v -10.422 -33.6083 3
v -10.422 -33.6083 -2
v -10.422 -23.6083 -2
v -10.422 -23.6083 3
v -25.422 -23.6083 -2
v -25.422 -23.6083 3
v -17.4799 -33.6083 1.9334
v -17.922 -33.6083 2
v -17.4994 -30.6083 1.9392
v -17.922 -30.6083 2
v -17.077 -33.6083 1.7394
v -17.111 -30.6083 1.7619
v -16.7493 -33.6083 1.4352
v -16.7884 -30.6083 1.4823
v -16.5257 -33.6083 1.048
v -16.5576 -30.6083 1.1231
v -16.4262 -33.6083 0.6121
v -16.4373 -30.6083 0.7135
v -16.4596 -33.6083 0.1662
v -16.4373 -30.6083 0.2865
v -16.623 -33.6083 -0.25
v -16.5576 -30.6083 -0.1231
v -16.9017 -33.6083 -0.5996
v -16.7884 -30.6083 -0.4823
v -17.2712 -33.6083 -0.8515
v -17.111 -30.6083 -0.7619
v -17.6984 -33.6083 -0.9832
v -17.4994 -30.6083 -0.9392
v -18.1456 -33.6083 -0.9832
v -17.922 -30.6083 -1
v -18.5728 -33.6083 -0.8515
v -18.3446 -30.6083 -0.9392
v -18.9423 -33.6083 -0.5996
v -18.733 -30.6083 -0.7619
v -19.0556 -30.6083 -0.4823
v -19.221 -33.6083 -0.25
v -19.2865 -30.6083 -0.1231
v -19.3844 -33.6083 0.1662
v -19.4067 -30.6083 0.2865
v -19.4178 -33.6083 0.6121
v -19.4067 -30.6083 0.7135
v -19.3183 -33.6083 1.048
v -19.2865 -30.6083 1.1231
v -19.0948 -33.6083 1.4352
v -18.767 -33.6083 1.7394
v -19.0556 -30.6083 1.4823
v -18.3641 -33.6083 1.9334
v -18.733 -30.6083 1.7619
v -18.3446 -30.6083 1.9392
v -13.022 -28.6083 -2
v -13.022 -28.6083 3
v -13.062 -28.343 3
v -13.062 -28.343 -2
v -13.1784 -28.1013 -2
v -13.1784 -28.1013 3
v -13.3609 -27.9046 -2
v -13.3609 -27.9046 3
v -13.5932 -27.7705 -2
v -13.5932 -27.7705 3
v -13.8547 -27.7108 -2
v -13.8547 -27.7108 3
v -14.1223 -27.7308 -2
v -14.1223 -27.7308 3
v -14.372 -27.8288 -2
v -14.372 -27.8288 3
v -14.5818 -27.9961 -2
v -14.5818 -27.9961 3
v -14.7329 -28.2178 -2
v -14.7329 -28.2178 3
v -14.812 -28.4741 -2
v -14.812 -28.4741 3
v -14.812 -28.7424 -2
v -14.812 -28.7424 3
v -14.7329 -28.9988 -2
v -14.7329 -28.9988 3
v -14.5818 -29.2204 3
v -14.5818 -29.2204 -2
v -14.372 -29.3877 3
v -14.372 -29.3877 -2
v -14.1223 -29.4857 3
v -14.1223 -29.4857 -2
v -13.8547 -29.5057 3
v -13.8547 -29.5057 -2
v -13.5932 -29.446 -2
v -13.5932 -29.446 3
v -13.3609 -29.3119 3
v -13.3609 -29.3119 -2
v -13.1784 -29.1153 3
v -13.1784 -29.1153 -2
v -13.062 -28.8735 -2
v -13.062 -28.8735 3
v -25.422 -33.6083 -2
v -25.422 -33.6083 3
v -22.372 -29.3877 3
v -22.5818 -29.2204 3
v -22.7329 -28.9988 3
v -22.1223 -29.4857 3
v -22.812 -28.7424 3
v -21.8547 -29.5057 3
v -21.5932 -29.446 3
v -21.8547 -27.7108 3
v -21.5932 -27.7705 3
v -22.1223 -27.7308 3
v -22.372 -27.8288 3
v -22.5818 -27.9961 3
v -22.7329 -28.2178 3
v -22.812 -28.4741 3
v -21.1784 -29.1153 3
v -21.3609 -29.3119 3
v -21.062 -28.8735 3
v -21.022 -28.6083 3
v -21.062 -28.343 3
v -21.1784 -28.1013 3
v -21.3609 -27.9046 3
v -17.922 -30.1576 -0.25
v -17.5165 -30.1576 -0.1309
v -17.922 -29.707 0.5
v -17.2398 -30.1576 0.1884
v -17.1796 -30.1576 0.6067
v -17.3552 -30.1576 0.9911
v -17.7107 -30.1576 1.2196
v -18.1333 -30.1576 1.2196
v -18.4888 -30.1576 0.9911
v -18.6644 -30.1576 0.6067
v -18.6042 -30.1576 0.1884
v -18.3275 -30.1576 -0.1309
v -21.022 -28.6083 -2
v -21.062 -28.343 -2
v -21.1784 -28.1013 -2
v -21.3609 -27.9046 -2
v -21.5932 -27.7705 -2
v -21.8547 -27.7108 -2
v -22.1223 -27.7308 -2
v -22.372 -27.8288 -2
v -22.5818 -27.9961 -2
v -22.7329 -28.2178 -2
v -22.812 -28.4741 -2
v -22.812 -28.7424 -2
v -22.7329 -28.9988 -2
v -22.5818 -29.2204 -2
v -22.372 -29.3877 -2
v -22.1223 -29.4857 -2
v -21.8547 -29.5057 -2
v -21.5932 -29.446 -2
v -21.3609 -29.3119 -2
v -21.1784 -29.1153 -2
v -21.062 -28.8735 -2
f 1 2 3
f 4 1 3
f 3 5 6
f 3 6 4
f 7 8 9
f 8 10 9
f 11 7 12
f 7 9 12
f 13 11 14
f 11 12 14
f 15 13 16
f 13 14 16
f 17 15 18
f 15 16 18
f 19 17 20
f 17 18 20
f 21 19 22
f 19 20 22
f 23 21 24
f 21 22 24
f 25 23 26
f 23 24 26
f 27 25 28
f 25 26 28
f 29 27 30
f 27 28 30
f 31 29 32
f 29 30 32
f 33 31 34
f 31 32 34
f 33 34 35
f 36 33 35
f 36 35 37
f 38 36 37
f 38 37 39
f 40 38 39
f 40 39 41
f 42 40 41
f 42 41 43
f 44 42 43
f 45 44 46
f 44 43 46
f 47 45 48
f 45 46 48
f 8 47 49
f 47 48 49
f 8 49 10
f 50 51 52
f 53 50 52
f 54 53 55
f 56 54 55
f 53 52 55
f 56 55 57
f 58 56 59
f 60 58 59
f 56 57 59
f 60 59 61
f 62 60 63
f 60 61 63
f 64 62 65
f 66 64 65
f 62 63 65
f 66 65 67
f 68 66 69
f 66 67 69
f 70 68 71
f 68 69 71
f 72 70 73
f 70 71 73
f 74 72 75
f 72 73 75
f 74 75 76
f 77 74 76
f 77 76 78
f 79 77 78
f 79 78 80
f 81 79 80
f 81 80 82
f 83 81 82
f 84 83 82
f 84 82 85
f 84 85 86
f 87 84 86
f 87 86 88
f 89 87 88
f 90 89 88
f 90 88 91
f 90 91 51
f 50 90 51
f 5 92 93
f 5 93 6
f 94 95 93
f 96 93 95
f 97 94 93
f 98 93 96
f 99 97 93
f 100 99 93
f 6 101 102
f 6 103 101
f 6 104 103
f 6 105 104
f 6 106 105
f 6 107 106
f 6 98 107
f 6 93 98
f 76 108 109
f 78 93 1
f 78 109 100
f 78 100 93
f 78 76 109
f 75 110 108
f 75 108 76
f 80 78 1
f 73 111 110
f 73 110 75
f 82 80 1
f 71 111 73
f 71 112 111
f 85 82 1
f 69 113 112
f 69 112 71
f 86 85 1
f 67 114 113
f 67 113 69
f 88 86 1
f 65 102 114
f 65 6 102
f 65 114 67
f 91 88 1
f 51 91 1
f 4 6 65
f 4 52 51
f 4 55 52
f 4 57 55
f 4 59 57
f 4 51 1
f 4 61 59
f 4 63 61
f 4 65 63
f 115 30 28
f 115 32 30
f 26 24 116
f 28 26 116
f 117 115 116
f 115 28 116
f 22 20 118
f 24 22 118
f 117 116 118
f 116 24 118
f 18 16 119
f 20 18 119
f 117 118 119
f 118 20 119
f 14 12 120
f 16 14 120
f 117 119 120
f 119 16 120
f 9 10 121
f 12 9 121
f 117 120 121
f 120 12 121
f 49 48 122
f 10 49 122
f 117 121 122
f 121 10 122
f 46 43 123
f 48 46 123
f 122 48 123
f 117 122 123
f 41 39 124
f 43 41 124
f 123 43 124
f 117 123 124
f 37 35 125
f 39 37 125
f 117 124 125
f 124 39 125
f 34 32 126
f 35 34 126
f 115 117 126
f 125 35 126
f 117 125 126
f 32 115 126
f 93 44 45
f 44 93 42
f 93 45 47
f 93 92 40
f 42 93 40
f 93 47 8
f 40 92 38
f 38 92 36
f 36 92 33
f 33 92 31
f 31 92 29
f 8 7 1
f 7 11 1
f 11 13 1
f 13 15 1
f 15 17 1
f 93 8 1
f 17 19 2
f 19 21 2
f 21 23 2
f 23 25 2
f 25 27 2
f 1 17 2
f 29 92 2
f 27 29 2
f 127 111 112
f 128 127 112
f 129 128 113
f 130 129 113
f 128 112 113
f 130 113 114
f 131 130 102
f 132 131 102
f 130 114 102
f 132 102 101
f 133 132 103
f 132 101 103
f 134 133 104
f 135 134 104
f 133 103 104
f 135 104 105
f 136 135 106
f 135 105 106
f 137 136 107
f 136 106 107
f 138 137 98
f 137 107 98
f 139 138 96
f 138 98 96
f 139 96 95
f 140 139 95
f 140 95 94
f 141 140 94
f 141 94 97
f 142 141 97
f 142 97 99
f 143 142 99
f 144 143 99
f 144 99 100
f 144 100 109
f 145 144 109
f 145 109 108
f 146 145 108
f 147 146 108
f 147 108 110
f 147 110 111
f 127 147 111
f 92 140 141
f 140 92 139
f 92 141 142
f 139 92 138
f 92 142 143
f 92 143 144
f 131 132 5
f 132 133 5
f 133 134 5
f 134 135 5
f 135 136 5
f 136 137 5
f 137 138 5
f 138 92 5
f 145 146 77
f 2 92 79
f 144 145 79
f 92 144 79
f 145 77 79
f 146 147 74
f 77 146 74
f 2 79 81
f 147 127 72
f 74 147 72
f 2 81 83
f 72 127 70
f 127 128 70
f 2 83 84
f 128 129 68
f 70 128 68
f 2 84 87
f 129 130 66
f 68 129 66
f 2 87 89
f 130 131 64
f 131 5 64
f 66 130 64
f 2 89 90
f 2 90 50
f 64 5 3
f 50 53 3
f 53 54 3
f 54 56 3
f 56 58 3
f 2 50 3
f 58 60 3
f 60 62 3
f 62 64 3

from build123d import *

# Parameters (mm, degrees)
BOSS_EXTRU_1_DEPTH      = 3
BOSS_EXTRU_1_DEPTH_BACK = 2
ESQUISSE1_W             = 15
ESQUISSE1_H             = 10
D_GAGEMENT_M1_61_D      = 1.8
D_GAGEMENT_M1_61_DEPTH  = 28.17
D_GAGEMENT_M1_61_TIP    = 0.540774557
D_GAGEMENT_M1_62_D      = 3
D_GAGEMENT_M1_62_DEPTH  = 3
D_GAGEMENT_M1_62_TIP    = 0.901290929


with BuildPart() as part:
    # Esquisse1 → Boss.-Extru.1 (new, two sides: drawn at the far end of the back side and taken through both)
    with BuildSketch(Plane.XY.offset(-BOSS_EXTRU_1_DEPTH_BACK)):
        with Locations((-17.922006263, -28.608262445)):
            Rectangle(ESQUISSE1_W, ESQUISSE1_H)
    extrude(amount=BOSS_EXTRU_1_DEPTH + BOSS_EXTRU_1_DEPTH_BACK)

    # Dégagement M1.61
    with Locations(Plane(origin=(-21.922006263, -28.608262445, -2), x_dir=(-1, 0, 0), z_dir=(0, 0, -1))):
        with Locations((0, 0), (-8, 0)):
            Hole(D_GAGEMENT_M1_61_D / 2, depth=D_GAGEMENT_M1_61_DEPTH)
            with Locations((0, 0, -(D_GAGEMENT_M1_61_DEPTH + D_GAGEMENT_M1_61_TIP / 2))):  # 118° drill point
                Cone(0, D_GAGEMENT_M1_61_D / 2, D_GAGEMENT_M1_61_TIP, mode=Mode.SUBTRACT)

    # Dégagement M1.62
    with Locations(Plane(origin=(-17.922006263, -33.608262445, 0.5), x_dir=(0, 0, -1), z_dir=(0, -1, 0))):
        with Locations((0, 0)):
            Hole(D_GAGEMENT_M1_62_D / 2, depth=D_GAGEMENT_M1_62_DEPTH)
            with Locations((0, 0, -(D_GAGEMENT_M1_62_DEPTH + D_GAGEMENT_M1_62_TIP / 2))):  # 118° drill point
                Cone(0, D_GAGEMENT_M1_62_D / 2, D_GAGEMENT_M1_62_TIP, mode=Mode.SUBTRACT)


solid = part.part
